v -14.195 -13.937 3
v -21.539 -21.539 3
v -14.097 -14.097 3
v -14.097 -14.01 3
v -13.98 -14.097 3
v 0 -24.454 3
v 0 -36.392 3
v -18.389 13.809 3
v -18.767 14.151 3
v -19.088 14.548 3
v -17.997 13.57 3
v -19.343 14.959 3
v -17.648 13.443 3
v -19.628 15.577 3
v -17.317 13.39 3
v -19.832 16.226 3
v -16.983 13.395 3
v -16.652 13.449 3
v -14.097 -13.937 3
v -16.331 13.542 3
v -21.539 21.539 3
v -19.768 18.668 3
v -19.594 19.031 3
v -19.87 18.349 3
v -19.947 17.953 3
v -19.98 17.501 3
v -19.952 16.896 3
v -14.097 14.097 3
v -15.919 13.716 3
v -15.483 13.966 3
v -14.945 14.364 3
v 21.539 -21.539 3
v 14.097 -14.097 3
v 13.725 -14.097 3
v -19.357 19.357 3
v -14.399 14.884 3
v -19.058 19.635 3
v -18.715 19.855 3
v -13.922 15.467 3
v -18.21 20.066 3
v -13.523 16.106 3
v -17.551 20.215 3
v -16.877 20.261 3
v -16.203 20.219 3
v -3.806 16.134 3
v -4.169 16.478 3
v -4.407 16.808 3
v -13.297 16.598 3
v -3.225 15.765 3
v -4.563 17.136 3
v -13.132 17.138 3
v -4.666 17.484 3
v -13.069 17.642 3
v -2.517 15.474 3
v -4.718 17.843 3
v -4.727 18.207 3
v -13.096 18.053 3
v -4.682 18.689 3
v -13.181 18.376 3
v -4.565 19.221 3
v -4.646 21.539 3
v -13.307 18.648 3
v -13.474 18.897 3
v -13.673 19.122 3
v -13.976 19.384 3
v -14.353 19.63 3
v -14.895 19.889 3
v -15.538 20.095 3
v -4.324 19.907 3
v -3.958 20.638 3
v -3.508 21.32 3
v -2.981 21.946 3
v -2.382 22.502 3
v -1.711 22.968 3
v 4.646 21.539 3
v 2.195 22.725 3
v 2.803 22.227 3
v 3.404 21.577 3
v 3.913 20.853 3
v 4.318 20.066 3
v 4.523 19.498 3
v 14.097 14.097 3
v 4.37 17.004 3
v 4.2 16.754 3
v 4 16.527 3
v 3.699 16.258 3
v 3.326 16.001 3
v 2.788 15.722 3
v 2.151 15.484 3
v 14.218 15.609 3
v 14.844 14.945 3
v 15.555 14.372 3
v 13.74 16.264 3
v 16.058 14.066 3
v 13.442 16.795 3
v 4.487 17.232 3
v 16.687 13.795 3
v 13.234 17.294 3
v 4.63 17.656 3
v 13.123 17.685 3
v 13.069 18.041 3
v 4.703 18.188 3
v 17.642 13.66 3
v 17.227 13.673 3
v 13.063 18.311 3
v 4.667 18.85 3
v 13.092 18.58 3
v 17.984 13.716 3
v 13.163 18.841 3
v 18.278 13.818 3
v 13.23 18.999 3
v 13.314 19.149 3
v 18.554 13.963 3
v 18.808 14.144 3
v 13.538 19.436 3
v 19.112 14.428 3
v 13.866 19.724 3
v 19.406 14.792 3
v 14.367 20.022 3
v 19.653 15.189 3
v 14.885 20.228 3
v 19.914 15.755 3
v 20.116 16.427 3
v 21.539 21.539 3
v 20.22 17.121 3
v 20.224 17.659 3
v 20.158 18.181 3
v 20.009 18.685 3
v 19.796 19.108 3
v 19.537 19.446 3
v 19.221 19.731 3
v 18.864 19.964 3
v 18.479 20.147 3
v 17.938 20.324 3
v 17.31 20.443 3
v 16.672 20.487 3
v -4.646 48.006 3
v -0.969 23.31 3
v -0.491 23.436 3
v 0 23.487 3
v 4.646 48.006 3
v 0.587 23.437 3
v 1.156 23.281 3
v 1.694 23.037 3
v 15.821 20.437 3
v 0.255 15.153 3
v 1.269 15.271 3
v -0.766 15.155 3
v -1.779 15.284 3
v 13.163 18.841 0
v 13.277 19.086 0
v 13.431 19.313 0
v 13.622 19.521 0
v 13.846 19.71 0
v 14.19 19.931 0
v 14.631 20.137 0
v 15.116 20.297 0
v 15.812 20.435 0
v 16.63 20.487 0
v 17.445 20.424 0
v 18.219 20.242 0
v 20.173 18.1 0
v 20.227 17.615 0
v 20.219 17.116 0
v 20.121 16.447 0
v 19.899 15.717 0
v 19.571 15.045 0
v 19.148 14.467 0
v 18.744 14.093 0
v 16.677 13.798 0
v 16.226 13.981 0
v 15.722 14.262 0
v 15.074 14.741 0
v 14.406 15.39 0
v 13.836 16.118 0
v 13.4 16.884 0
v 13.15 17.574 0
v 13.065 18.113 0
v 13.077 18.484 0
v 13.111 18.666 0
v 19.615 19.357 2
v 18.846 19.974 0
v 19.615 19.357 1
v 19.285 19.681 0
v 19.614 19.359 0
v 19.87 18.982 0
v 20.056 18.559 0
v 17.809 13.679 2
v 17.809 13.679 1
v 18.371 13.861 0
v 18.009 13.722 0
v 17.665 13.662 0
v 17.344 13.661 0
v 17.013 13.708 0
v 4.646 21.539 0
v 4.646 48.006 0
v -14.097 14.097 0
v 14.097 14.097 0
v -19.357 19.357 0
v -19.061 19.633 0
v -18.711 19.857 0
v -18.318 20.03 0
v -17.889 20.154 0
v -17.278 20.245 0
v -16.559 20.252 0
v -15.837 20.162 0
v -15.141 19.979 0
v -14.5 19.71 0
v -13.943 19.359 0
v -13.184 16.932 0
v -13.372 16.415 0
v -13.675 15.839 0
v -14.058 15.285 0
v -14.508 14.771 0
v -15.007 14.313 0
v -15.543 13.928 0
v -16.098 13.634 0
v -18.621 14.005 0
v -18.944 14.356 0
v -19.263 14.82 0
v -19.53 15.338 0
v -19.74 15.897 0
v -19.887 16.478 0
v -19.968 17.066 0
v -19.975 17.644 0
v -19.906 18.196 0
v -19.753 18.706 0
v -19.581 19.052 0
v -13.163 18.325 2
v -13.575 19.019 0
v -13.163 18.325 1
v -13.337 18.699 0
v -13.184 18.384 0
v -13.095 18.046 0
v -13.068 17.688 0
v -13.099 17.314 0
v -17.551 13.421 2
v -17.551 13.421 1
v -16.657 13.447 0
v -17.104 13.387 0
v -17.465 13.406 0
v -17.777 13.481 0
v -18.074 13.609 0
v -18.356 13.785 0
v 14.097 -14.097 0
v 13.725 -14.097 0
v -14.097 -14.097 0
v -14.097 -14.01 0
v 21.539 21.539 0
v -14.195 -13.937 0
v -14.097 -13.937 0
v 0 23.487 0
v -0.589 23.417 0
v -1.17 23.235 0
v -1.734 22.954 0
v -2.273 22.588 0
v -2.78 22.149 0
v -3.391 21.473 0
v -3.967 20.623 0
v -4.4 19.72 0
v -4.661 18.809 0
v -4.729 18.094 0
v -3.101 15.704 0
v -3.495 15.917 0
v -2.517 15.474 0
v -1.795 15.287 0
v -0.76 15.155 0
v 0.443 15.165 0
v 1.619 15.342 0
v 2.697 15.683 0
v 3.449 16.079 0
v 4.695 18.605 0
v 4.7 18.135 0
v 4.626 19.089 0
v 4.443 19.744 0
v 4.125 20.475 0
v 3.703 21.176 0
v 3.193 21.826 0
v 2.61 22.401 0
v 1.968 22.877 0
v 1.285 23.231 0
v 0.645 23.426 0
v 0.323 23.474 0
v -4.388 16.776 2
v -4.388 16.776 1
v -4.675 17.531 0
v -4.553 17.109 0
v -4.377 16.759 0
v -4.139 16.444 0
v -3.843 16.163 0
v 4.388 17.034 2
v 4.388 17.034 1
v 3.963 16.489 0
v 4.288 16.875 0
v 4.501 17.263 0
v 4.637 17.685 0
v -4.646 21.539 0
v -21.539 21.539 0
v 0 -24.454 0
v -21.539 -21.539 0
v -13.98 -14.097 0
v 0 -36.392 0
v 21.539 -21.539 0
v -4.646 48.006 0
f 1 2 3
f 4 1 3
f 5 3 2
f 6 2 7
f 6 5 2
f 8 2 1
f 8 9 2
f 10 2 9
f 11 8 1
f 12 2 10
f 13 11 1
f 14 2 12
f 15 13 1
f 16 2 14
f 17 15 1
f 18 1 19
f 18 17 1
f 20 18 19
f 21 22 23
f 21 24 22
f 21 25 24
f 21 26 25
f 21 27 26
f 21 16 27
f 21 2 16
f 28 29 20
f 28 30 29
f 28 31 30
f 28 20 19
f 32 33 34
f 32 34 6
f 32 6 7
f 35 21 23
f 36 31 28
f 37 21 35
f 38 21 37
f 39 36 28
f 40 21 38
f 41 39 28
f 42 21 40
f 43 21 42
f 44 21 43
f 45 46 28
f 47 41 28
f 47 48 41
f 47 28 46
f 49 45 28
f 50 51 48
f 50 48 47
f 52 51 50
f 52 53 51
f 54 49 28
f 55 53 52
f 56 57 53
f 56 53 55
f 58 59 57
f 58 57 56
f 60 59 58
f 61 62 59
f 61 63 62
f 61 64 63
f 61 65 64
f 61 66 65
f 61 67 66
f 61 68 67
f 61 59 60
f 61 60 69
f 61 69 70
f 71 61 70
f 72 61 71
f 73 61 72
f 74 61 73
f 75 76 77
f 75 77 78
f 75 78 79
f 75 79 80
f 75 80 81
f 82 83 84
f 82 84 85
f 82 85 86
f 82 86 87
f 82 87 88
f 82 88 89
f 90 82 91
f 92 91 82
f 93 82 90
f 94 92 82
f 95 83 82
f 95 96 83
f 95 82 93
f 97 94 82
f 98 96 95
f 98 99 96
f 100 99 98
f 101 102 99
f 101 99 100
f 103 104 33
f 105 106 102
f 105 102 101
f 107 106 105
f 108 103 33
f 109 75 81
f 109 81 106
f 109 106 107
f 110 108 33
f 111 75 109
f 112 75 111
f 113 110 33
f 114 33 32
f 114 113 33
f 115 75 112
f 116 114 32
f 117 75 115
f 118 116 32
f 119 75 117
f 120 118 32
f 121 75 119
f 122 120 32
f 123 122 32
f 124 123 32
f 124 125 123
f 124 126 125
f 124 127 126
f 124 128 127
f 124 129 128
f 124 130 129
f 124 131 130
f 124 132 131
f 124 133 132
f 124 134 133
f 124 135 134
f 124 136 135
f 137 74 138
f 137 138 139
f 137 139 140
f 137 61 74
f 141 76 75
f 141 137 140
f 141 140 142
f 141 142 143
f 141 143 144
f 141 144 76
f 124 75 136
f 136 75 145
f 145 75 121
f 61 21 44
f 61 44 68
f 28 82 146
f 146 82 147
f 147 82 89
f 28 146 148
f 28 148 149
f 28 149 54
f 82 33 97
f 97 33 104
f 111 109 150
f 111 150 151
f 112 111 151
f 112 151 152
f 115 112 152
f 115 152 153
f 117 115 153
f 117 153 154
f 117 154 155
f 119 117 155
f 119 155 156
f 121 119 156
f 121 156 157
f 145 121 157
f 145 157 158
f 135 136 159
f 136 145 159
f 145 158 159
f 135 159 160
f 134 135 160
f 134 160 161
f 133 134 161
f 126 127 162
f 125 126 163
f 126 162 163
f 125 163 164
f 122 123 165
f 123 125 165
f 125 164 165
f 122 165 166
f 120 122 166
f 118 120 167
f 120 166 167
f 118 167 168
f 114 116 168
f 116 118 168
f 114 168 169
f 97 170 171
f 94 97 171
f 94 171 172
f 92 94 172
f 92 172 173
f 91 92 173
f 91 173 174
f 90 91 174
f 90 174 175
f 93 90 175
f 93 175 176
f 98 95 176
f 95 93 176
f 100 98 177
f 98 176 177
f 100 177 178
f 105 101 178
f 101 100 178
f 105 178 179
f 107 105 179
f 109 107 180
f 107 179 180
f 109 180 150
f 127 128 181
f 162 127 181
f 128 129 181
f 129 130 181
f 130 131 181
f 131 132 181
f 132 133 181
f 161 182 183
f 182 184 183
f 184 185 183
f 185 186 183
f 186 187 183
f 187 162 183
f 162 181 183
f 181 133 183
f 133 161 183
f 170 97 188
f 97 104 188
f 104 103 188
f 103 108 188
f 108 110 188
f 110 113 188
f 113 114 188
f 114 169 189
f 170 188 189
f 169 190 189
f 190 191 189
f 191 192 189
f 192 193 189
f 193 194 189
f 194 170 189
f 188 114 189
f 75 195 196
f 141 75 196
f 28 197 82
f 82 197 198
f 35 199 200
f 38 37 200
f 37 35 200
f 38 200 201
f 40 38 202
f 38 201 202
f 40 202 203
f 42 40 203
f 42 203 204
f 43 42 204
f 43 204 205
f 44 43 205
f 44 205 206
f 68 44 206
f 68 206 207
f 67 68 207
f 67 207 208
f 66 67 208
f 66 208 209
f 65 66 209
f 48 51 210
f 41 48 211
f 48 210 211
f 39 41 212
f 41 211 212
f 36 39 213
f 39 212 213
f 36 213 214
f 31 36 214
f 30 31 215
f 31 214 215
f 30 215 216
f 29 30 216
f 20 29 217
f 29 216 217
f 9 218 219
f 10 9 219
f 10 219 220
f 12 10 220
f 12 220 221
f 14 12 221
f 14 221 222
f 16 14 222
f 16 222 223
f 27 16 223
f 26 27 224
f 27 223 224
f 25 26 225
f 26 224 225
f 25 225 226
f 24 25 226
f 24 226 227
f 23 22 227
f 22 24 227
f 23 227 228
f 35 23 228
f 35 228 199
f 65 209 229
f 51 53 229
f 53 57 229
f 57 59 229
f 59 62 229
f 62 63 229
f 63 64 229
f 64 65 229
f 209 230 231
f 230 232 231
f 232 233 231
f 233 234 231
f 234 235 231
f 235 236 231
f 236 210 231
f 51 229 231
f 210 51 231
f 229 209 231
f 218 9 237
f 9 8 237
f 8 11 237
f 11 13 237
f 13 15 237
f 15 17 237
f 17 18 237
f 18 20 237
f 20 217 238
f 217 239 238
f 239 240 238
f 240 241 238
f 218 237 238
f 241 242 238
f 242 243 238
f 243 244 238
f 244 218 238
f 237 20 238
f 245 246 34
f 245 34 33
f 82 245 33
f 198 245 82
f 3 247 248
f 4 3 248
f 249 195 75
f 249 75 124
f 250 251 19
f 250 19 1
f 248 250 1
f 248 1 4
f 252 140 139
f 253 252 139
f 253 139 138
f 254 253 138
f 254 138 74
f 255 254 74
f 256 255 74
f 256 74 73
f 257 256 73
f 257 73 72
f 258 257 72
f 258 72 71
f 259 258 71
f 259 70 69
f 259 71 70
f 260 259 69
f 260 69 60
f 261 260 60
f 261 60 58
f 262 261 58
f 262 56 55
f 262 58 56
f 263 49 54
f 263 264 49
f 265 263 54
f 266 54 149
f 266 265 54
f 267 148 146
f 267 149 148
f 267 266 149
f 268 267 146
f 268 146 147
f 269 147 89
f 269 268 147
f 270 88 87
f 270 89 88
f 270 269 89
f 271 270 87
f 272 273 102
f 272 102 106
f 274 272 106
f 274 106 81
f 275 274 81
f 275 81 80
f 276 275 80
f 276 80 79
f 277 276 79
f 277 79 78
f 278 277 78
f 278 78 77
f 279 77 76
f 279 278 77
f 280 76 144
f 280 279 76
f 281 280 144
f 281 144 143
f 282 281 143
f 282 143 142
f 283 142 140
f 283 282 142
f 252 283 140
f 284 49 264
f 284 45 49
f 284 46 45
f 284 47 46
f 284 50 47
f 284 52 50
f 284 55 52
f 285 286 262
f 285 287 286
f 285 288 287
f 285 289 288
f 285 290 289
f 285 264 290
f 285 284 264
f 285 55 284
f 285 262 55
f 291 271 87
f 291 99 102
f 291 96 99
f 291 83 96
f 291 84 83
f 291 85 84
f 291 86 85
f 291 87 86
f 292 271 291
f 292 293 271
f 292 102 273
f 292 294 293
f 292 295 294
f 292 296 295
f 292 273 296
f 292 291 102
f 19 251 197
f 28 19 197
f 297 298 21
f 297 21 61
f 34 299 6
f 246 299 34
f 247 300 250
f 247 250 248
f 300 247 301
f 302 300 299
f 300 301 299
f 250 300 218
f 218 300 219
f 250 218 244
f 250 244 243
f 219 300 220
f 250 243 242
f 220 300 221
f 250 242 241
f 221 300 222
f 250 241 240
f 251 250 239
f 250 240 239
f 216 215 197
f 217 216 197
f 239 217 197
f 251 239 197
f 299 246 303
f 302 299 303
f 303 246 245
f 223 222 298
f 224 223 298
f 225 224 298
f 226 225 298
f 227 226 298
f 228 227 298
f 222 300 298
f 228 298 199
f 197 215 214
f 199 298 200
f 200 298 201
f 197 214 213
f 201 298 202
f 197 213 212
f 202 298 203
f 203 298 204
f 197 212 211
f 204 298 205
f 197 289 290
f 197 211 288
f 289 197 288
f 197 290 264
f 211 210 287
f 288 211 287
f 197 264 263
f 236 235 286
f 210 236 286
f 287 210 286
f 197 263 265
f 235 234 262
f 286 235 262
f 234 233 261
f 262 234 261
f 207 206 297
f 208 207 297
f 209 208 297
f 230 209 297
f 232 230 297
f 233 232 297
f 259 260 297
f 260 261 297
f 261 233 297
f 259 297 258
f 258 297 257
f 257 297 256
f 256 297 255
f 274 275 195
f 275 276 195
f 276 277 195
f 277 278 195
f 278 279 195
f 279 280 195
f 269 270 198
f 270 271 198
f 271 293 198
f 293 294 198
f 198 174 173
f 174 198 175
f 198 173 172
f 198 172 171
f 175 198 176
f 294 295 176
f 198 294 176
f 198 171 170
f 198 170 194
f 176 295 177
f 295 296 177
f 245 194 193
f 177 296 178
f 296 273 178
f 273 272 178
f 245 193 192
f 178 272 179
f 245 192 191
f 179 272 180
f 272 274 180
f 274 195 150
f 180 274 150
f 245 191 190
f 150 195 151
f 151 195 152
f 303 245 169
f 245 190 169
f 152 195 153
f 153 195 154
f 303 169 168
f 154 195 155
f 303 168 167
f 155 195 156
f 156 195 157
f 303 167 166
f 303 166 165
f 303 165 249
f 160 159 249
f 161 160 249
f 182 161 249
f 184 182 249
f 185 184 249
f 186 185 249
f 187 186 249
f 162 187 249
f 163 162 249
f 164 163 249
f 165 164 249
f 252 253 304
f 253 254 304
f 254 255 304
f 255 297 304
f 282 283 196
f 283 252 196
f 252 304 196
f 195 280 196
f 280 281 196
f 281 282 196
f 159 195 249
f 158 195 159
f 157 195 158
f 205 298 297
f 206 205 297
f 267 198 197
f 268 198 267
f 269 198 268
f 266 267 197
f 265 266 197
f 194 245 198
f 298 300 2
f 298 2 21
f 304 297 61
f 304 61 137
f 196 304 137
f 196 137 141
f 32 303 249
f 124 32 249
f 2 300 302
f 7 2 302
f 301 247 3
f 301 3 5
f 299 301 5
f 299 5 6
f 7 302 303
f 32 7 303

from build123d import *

# Parameters (mm, degrees)
F0_W     = 43.0784
F0_H     = 43.0784
F0_W_2   = 28.194
F0_H_2   = 28.194
F1_DEPTH = 3
F2_DEPTH = 3
F3_W     = 9.291484952
F3_H     = 26.8420688808
F4_DEPTH = 3
F6_DEPTH = 22.352
F8_DEPTH = 37.592


with BuildPart() as f1:
    # F0 (on Top) → F1 (new body)
    with BuildSketch(Plane.XY):
        Rectangle(F0_W, F0_H)
        Rectangle(F0_W_2, F0_H_2, mode=Mode.SUBTRACT)
    extrude(amount=F1_DEPTH)

    # F0 (on Top) → F2 (join)
    with BuildSketch(Plane.XY):
        Polygon((0, -36.3916456699), (21.5392, -21.5392), (-21.5392, -21.5392), align=None)
    extrude(amount=F2_DEPTH)

    # F3 (on Top) → F4 (join)
    with BuildSketch(Plane.XY):
        with Locations((0, 34.5849692822)):
            Rectangle(F3_W, F3_H)
    extrude(amount=F4_DEPTH)

    # F5 (on Top) → F6 (cut)
    with BuildSketch(Plane.XY):
        Polygon((13.937224634, -13.9372255653), (-14.1953229904, -13.9372255653), (0, -24.4544502348), align=None)
    extrude(amount=F6_DEPTH, mode=Mode.SUBTRACT)

    # F7 (on Top) → F8 (cut)
    with BuildSketch(Plane.XY):
        with BuildLine():
            add(Edge.make_bspline(
                [(0, 23.4868060797), (-2.8702715447, 23.4371938797), (-8.7230750332, 14.3130976788), (8.6871508239, 14.7943300147), (2.8315725317, 23.5357493733), (0, 23.4868060797)],
                knots=[0, 0, 0, 0, 0.3297145674, 0.6747308756, 1, 1, 1, 1], degree=3))
        make_face()
        with BuildLine():
            add(Edge.make_bspline(
                [(13.1629370153, 18.8410654664), (13.847737823, 20.7262262605), (22.2669237883, 21.4924345024), (18.5518491877, 10.0392684338), (12.4536267966, 16.8884336936), (13.1629370153, 18.8410654664)],
                knots=[0, 0, 0, 0, 0.333863774, 0.6541870513, 1, 1, 1, 1], degree=3))
        make_face()
        with BuildLine():
            add(Edge.make_bspline(
                [(-19.357258454, 19.357258454), (-17.9187135648, 20.9835638848), (-9.6064176323, 19.5614210753), (-18.3365898164, 9.788019721), (-20.7872220735, 17.74065433), (-19.357258454, 19.357258454)],
                knots=[0, 0, 0, 0, 0.3313807833, 0.6705959836, 1, 1, 1, 1], degree=3))
        make_face()
    extrude(amount=F8_DEPTH, mode=Mode.SUBTRACT)


solid = f1.part
